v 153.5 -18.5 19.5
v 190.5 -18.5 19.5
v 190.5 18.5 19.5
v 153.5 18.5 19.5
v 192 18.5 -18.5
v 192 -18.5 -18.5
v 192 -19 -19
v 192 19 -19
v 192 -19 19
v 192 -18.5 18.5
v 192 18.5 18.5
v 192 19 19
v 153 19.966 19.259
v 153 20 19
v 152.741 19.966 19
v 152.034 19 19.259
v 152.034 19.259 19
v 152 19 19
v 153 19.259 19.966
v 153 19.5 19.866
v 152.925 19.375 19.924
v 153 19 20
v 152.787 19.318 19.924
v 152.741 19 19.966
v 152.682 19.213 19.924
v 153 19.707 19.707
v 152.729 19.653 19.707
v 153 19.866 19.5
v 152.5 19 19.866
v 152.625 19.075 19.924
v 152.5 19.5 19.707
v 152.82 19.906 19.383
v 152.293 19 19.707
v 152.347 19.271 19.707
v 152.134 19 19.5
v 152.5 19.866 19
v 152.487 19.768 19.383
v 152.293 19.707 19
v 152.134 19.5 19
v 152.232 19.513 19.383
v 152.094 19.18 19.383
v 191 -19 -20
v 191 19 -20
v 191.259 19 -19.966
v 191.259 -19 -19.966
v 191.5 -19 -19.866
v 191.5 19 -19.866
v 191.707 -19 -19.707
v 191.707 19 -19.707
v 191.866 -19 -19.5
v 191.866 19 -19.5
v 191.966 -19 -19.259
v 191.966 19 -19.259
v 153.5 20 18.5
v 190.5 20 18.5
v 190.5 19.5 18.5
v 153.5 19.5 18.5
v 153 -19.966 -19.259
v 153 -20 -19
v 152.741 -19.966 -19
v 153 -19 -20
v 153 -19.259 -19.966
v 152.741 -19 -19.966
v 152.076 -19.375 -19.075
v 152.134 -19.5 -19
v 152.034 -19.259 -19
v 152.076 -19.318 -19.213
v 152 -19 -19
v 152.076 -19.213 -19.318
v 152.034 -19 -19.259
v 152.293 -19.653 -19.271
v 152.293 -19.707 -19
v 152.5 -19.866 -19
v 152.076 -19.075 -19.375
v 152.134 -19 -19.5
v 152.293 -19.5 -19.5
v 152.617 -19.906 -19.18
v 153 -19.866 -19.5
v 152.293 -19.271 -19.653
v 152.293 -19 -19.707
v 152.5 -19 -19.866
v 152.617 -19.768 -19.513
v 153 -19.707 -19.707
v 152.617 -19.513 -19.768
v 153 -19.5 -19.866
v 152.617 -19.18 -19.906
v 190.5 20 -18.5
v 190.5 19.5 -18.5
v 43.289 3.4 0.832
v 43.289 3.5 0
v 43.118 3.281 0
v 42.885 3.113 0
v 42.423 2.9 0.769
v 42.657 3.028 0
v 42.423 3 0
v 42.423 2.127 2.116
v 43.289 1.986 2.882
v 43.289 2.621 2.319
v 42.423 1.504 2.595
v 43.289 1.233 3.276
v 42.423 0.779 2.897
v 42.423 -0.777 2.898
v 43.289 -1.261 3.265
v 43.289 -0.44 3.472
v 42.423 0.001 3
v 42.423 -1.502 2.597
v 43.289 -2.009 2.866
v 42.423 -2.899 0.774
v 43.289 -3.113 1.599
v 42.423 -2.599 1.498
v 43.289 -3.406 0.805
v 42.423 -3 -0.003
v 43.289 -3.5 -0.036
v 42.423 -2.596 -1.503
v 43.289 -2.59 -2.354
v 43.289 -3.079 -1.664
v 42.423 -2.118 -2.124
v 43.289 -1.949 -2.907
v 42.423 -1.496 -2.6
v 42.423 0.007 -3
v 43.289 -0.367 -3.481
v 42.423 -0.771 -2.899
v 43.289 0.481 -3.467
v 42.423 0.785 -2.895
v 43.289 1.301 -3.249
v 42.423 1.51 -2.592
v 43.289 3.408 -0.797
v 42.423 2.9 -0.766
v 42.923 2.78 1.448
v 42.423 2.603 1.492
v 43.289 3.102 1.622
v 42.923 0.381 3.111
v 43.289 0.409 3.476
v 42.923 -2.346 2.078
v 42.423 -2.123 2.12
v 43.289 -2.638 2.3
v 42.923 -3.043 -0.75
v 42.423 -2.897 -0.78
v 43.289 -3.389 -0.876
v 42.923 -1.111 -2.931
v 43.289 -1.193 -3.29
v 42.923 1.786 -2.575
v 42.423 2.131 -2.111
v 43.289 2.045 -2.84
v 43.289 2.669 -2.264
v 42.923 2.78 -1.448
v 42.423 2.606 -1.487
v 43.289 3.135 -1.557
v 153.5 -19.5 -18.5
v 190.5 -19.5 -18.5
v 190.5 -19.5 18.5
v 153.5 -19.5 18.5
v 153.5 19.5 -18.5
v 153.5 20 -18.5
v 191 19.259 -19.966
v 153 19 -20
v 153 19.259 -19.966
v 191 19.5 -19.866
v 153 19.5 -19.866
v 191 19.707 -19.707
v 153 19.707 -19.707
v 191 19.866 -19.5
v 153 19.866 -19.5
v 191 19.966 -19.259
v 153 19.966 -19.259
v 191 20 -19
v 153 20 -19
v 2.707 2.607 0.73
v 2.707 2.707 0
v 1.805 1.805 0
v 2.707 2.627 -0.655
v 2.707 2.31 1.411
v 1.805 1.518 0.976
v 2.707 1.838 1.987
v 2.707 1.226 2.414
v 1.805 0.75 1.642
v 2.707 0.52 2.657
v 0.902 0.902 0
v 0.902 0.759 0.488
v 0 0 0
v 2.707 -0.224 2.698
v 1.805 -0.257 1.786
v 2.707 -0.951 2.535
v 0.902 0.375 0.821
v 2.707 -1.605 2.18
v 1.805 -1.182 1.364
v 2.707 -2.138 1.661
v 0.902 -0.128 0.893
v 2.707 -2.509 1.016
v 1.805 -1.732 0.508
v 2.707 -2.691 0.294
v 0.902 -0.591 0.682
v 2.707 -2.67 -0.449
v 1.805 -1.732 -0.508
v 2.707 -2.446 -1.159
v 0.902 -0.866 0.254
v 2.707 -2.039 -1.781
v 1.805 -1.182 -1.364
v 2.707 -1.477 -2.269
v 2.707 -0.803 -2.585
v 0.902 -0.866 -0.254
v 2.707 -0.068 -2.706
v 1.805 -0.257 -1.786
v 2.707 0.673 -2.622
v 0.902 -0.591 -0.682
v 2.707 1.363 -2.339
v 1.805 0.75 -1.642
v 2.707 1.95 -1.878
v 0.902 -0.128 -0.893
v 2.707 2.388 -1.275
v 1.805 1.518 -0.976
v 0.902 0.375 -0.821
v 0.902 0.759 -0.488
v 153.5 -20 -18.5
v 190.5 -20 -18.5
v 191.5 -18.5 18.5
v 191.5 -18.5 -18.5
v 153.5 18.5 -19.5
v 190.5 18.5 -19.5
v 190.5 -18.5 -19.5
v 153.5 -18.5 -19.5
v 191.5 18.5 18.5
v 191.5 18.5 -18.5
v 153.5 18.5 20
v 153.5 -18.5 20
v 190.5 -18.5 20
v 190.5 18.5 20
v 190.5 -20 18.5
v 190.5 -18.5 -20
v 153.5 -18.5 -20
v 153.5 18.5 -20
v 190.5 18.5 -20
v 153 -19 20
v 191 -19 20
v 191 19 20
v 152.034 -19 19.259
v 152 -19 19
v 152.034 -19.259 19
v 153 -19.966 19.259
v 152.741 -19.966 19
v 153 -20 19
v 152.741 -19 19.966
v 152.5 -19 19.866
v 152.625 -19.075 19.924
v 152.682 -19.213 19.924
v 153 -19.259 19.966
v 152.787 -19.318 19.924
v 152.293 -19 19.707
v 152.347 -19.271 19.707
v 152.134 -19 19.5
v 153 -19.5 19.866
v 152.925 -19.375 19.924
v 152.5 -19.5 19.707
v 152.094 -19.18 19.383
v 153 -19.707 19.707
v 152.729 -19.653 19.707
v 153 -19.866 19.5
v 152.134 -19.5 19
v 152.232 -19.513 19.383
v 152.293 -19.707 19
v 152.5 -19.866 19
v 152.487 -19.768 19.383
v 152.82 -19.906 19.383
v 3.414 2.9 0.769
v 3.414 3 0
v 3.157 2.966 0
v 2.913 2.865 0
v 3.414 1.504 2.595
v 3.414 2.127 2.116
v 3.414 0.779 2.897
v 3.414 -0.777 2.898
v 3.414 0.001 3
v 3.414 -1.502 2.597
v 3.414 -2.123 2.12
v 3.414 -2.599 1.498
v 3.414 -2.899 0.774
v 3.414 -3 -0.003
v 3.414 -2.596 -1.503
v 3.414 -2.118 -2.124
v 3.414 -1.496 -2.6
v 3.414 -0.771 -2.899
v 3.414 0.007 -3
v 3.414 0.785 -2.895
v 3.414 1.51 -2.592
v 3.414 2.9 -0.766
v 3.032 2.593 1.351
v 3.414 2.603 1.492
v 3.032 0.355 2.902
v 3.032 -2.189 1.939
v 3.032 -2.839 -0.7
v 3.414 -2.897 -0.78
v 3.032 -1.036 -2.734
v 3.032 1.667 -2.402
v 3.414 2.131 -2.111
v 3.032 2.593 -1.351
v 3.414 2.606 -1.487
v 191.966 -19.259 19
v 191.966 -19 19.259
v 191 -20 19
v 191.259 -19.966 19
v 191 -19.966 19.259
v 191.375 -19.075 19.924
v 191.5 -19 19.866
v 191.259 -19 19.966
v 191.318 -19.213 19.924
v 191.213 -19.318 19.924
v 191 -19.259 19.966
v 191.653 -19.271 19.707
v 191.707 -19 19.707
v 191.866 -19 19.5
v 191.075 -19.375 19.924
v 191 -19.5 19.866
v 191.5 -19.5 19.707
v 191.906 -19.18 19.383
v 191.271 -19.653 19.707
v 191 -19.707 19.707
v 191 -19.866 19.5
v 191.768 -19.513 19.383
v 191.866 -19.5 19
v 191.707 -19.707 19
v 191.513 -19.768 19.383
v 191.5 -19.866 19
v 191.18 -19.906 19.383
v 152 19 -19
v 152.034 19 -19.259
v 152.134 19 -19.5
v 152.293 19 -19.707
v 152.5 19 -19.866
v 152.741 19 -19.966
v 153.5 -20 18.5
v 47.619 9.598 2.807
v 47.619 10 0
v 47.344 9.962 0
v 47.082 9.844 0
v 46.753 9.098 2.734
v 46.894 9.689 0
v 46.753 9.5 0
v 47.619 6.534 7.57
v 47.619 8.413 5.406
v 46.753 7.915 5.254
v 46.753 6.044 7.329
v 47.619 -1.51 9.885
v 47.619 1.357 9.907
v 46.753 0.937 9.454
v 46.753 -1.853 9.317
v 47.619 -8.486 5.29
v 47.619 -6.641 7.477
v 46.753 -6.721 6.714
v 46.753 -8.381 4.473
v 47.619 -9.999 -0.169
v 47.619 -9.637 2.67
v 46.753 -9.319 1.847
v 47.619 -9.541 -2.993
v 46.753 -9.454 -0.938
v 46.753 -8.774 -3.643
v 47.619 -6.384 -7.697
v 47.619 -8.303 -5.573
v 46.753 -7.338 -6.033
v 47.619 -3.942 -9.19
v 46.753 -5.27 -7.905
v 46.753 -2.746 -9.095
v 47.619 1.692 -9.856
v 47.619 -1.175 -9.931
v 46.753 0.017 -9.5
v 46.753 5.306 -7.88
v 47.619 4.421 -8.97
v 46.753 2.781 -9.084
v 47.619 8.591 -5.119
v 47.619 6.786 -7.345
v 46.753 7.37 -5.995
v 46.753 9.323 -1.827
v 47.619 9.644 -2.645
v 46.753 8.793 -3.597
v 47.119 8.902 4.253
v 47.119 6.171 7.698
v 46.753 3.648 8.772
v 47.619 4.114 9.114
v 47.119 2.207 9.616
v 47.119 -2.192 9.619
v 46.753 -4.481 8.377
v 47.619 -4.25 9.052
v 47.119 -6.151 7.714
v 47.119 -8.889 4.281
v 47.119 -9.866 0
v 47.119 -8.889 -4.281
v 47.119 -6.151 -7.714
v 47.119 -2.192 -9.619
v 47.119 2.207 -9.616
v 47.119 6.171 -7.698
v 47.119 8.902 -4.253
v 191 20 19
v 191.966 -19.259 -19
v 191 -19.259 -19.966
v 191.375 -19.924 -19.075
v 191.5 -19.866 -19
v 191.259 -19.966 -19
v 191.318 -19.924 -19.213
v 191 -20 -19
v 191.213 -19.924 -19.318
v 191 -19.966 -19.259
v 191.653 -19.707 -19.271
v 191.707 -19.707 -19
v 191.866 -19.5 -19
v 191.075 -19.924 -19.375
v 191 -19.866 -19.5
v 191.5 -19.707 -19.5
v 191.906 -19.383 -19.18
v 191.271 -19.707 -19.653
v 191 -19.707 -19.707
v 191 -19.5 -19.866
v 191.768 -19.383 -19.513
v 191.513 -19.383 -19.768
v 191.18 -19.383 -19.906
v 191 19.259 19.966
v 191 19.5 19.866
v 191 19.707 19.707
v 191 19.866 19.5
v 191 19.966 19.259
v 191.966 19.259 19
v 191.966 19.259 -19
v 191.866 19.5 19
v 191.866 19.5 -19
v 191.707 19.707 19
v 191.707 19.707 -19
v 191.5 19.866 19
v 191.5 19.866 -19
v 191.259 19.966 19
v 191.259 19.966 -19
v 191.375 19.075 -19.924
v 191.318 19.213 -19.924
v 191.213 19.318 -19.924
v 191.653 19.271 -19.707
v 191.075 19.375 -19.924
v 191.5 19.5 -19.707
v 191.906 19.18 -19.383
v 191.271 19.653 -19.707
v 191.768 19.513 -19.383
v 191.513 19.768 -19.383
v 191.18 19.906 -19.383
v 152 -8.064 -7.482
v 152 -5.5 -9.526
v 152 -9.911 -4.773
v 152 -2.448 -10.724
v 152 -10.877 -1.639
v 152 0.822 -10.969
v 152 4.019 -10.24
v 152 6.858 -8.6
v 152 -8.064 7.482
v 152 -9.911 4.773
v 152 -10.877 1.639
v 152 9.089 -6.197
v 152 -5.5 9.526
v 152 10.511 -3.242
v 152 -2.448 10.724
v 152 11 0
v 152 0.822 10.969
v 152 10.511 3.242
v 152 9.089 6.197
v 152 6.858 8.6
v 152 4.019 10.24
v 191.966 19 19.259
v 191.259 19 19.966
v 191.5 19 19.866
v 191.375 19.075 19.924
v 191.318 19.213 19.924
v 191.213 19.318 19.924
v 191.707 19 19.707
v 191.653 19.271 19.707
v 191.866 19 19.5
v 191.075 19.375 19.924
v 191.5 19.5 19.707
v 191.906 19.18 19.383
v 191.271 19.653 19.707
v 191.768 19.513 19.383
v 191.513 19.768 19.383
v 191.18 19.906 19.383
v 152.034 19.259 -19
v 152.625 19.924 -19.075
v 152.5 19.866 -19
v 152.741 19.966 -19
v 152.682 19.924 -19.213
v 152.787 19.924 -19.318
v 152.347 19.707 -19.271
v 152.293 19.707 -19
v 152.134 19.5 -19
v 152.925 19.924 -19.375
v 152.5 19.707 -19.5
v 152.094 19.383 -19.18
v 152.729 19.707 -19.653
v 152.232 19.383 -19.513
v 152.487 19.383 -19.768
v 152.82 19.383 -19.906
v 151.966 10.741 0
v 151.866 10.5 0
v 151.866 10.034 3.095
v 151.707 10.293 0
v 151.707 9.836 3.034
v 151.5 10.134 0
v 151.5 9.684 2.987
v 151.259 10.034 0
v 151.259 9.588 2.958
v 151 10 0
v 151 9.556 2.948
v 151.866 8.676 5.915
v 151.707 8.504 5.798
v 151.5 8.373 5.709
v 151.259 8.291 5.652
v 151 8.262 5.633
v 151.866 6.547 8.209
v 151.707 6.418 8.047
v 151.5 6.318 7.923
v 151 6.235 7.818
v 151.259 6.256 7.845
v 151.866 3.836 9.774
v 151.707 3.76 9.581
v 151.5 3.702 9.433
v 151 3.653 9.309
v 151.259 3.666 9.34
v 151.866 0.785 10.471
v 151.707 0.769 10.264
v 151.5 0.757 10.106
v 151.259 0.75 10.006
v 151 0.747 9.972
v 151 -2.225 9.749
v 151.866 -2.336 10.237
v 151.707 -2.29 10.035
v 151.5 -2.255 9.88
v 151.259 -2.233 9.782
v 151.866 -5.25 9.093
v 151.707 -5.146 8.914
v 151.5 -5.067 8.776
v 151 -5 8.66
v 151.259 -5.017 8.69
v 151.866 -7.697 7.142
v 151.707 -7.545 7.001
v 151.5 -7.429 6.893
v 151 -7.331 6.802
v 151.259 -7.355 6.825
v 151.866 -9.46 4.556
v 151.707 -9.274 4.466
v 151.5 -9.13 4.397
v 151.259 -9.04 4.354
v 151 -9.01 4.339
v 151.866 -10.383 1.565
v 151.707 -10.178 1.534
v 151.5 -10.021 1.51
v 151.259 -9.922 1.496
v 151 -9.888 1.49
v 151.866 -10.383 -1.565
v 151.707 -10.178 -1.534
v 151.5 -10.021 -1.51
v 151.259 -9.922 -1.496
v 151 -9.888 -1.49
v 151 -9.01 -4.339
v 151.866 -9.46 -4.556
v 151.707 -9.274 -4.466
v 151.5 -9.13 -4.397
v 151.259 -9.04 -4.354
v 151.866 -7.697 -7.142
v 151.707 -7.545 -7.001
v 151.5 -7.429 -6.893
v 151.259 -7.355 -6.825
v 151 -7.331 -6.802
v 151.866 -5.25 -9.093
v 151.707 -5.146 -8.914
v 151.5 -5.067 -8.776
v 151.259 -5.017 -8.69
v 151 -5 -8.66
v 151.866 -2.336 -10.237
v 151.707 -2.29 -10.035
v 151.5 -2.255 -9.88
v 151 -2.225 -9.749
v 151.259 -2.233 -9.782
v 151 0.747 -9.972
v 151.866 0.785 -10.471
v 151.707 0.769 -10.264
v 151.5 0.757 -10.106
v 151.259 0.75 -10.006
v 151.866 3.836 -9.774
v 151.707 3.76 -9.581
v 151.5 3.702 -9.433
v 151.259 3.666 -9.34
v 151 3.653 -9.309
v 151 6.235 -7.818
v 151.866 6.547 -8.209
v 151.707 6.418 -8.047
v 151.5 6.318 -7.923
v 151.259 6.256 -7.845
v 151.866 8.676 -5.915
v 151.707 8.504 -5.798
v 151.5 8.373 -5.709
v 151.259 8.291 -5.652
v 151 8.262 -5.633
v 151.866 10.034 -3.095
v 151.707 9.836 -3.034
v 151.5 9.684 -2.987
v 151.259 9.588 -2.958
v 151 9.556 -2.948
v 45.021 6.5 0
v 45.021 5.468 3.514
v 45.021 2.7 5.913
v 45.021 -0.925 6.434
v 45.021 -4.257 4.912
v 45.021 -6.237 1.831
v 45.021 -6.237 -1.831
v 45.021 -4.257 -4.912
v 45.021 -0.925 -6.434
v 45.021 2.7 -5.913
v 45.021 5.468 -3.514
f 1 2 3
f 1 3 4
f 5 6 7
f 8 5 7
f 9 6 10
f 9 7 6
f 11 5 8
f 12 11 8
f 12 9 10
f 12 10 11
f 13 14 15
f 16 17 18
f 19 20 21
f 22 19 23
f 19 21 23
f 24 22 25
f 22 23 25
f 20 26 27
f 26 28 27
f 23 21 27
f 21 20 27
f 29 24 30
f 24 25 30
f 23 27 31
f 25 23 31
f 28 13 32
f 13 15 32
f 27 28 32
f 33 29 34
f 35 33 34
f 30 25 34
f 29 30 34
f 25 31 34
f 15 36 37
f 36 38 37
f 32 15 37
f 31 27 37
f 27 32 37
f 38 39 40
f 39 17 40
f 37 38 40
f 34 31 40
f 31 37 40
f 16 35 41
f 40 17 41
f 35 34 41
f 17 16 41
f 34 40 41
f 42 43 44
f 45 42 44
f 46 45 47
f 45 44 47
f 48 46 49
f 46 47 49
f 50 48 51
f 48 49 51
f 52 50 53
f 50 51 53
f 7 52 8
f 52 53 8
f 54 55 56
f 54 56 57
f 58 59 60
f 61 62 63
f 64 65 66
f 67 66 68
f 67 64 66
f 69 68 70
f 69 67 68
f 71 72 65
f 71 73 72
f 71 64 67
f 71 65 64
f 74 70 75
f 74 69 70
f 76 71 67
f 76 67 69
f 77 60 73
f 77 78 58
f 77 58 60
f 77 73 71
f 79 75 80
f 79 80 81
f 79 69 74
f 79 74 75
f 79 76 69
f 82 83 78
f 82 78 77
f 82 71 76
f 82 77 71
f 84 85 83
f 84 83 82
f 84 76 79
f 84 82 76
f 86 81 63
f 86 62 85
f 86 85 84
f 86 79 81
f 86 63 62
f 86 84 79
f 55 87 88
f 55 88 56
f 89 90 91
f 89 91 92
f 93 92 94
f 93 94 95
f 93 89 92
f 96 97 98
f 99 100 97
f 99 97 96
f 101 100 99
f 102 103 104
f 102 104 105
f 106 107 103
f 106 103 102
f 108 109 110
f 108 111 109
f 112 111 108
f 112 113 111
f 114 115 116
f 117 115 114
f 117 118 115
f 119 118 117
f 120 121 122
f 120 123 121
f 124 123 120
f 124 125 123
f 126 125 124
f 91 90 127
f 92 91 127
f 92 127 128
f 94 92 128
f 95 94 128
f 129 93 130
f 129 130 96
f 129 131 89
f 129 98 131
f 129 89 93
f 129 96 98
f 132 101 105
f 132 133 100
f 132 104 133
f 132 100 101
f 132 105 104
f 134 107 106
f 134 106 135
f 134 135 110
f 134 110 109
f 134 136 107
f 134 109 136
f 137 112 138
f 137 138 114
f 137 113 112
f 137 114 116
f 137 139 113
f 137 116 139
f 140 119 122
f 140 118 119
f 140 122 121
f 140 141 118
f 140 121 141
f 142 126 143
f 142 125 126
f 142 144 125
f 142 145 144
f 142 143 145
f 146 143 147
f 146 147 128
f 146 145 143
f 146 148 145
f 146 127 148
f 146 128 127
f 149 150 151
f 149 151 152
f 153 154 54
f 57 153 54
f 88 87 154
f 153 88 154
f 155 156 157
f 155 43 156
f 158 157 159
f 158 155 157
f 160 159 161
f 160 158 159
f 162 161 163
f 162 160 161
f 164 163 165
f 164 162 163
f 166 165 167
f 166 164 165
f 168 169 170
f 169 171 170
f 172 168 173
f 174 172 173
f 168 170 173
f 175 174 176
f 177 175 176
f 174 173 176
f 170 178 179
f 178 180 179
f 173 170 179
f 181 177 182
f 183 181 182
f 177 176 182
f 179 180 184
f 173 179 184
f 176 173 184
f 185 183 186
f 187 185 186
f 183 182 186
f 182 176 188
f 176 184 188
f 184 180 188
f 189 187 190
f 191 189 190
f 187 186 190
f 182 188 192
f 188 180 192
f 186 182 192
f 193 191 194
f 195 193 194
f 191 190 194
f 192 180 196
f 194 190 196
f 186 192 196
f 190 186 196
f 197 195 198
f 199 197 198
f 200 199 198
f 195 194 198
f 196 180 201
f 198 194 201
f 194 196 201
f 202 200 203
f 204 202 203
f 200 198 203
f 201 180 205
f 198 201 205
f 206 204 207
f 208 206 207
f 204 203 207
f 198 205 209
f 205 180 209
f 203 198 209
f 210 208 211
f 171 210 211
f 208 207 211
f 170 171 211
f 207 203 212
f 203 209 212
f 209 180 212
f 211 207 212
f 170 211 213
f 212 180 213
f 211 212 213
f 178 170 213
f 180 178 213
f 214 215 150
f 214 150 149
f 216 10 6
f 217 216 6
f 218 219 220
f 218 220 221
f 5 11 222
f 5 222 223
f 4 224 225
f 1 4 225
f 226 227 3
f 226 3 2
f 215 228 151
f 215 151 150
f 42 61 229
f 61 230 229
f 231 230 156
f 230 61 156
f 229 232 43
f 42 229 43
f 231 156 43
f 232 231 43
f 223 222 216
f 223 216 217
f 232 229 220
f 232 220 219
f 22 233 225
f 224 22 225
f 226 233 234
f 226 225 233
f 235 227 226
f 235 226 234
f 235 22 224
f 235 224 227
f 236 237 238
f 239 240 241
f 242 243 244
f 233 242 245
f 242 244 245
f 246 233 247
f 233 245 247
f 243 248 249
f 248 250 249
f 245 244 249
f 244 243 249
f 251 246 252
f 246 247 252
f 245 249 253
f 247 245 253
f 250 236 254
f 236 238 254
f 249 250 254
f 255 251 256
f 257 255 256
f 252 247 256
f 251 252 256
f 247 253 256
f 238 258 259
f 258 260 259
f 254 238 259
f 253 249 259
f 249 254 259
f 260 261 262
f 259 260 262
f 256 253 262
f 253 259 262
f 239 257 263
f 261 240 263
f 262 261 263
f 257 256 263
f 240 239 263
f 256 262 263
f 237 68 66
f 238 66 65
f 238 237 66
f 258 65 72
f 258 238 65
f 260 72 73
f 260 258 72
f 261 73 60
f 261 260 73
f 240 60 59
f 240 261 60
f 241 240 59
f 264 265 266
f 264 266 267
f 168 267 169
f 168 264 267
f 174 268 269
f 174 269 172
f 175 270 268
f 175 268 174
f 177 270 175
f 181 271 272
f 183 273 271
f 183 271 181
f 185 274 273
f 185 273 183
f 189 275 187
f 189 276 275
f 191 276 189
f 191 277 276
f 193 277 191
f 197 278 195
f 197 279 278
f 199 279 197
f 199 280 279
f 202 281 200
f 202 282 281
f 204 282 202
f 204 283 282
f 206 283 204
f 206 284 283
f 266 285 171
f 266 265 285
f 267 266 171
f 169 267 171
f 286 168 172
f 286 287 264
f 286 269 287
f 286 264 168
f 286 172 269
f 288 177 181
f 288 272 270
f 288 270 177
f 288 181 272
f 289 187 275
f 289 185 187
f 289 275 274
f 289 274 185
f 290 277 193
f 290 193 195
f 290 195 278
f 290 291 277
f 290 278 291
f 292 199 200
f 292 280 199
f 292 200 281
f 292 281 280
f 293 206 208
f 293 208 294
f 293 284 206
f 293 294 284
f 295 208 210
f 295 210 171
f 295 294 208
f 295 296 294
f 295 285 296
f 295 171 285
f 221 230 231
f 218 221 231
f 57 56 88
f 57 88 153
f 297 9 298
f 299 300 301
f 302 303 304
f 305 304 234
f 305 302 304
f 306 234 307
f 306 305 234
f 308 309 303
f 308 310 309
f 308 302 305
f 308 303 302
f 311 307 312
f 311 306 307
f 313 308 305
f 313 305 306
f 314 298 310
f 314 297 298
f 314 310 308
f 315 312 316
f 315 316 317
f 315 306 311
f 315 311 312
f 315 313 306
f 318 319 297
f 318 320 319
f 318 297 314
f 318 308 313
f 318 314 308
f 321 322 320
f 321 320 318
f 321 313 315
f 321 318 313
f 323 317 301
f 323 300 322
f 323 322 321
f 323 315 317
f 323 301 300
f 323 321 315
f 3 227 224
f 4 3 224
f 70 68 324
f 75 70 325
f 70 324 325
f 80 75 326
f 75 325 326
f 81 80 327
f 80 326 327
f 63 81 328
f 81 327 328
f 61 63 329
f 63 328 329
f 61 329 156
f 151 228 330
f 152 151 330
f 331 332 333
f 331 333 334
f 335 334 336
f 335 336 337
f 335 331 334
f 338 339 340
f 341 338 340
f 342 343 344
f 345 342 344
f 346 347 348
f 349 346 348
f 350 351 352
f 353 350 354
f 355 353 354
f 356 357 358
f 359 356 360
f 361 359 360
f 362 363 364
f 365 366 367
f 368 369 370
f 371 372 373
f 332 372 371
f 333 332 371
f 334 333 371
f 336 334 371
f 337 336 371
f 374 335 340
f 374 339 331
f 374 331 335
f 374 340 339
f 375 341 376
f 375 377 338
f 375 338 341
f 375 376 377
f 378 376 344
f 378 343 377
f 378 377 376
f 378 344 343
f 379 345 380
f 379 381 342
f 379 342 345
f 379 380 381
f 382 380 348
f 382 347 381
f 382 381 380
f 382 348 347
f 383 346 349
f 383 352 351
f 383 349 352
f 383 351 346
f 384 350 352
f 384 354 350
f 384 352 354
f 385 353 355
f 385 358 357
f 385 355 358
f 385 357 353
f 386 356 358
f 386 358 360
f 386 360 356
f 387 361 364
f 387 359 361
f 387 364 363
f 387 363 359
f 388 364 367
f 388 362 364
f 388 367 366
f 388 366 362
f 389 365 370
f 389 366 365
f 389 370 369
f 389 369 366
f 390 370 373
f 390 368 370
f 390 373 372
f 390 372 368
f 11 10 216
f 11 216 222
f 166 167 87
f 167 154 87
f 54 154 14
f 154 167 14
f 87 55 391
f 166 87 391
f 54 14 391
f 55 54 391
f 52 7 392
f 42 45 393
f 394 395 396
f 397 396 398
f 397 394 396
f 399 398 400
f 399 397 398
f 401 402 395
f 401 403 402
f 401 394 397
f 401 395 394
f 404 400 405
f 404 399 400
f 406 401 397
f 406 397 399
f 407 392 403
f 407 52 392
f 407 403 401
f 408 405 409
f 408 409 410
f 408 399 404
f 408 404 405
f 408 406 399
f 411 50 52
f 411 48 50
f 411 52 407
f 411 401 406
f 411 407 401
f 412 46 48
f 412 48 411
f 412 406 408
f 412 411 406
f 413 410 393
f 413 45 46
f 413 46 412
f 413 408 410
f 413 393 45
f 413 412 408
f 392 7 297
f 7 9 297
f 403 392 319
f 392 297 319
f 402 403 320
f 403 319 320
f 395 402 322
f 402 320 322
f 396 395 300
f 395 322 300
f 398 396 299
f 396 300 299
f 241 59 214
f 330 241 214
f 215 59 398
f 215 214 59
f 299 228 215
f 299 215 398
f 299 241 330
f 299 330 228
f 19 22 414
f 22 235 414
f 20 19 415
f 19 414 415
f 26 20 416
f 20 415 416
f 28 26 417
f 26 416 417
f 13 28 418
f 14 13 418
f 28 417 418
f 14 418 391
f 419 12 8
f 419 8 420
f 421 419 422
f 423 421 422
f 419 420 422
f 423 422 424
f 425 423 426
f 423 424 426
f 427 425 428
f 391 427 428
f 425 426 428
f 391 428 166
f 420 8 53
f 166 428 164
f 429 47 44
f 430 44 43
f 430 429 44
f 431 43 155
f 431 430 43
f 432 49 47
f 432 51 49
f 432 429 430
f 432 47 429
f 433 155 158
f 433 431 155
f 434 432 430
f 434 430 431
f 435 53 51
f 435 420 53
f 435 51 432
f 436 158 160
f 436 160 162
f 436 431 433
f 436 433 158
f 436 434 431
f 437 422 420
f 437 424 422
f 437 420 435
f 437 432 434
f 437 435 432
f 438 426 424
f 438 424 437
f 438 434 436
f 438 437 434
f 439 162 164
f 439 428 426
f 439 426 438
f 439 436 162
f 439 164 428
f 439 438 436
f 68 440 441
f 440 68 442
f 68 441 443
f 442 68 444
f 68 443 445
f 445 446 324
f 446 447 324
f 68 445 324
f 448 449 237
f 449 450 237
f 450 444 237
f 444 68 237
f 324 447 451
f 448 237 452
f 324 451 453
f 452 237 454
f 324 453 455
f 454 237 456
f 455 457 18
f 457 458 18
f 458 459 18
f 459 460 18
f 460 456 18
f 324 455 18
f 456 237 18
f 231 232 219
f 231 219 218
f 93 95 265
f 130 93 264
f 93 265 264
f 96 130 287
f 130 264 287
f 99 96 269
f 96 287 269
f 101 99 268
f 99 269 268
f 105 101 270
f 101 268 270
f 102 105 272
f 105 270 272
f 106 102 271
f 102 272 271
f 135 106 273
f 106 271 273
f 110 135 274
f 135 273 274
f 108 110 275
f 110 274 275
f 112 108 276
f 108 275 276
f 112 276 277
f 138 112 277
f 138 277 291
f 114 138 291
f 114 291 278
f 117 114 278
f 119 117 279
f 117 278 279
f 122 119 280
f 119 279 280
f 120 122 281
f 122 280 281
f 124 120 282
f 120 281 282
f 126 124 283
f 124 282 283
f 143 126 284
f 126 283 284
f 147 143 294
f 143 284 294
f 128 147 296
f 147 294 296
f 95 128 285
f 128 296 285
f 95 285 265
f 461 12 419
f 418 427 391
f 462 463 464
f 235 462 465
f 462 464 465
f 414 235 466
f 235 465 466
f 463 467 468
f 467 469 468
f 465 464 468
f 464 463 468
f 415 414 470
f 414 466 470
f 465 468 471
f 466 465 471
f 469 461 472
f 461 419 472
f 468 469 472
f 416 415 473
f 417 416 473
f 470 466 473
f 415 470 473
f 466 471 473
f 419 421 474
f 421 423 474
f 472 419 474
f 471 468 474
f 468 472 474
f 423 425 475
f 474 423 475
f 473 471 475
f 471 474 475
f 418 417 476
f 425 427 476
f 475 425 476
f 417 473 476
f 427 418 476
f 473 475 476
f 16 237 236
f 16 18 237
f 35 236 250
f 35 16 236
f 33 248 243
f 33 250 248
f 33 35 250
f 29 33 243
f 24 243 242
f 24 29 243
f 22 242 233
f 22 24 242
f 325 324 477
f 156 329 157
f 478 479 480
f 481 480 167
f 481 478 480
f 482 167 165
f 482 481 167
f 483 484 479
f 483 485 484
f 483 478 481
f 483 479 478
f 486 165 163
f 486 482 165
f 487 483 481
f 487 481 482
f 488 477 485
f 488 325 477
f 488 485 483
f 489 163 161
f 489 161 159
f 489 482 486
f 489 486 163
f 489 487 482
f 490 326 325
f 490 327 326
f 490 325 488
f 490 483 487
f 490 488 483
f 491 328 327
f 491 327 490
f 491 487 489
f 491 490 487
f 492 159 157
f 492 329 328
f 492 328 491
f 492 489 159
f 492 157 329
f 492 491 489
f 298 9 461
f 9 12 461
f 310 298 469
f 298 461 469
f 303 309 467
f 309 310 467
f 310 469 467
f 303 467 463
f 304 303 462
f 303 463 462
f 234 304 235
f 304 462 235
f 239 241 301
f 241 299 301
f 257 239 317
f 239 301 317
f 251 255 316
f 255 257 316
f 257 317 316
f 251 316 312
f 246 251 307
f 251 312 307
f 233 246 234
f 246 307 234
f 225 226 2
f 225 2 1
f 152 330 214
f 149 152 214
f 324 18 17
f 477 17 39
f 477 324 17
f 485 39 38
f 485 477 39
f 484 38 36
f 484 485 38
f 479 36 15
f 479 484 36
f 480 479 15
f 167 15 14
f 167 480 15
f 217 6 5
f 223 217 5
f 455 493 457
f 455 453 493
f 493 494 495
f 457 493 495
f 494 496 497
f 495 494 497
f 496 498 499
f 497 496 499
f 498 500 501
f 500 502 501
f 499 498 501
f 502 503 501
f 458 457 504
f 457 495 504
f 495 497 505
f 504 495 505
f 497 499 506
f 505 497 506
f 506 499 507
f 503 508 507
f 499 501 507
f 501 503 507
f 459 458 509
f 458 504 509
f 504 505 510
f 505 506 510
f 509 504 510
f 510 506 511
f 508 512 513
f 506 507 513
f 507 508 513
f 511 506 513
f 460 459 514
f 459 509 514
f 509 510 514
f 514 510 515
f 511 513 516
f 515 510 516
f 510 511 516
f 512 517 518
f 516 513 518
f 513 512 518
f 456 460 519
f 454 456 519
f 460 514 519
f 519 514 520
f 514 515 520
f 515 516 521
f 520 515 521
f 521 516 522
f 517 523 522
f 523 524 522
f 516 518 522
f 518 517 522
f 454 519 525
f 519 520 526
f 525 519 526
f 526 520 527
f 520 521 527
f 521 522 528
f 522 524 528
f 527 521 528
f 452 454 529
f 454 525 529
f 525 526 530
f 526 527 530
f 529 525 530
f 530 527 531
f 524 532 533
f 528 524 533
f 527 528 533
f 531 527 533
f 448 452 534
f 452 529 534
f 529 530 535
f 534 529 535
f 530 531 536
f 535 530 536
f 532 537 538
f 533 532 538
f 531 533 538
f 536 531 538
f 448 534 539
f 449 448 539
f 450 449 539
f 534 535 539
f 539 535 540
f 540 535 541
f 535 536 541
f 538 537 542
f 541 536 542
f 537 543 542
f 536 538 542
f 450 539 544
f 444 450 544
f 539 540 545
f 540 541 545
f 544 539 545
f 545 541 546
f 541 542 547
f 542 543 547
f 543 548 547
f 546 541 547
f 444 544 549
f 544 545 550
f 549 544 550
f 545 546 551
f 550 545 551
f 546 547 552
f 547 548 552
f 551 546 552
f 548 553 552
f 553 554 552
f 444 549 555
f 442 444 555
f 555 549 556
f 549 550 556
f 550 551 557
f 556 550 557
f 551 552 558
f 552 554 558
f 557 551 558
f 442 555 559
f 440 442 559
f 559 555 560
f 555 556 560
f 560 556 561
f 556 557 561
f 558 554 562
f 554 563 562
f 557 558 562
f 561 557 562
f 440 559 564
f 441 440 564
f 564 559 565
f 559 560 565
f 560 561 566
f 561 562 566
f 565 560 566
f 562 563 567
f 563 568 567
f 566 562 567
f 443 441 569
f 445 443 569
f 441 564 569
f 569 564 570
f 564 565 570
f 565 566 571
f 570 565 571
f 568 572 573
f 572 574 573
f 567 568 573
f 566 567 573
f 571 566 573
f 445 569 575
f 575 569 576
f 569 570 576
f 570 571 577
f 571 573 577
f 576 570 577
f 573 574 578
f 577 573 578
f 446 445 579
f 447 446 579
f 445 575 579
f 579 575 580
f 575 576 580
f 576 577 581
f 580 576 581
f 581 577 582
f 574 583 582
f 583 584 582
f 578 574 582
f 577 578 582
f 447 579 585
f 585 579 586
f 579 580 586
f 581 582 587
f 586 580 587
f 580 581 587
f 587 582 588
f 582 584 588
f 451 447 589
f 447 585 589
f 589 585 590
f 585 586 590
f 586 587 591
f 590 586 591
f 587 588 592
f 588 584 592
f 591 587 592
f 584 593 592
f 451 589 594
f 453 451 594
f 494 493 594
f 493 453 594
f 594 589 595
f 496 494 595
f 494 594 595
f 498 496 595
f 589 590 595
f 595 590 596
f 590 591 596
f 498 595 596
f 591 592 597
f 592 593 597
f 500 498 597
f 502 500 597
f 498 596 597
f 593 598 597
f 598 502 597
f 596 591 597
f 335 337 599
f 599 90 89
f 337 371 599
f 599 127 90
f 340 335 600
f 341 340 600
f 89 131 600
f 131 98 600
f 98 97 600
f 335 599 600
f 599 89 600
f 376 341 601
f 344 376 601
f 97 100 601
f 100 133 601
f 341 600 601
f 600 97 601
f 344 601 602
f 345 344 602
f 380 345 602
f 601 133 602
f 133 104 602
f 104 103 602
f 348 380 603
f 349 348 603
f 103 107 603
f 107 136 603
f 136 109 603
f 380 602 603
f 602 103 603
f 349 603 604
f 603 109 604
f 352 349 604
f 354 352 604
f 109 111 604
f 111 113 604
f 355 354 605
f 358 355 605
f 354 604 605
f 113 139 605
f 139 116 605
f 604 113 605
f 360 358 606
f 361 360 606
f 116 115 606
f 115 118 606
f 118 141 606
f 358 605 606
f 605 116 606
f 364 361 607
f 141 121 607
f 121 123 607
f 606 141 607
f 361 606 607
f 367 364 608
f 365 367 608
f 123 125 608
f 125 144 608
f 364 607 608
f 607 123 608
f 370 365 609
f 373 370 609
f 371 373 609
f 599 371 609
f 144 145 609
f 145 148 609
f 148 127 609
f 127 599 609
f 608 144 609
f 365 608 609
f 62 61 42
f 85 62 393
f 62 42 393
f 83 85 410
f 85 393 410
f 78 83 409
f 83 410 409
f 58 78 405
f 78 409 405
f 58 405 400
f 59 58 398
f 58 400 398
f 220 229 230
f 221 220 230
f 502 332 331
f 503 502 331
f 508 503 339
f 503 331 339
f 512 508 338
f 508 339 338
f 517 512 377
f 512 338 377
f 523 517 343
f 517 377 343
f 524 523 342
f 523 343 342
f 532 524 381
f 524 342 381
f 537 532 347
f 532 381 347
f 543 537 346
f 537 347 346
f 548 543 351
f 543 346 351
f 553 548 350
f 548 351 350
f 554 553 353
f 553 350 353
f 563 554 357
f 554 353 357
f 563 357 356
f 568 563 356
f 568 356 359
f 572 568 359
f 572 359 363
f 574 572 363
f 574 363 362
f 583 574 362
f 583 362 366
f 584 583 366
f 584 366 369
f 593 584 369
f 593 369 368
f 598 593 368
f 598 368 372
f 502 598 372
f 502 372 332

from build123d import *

# Parameters (mm, degrees)
SKETCH2_W                = 40
SKETCH2_H                = 40
BOSS_EXTRUDE1_DEPTH      = 20
BOSS_EXTRUDE1_DEPTH_BACK = 20
FILLET2_R                = 1
FILLET3_R                = 1
SKETCH3_W                = 37
SKETCH3_H                = 37
CUT_EXTRUDE1_DEPTH       = 0.5
CIRPATTERN1_COUNT        = 4
CIRPATTERN3_COUNT        = 2
CIRPATTERN3_ANGLE        = 90


with BuildPart() as part:
    # Sketch1 → Revolve1 (revolve)
    with BuildSketch(Plane.XY):
        with BuildLine():
            Line((0, 0), (180, 0))
            Line((180, 0), (180, 2))
            ThreePointArc((180, 2), (177.656854249, 7.656854249), (172, 10))
            Line((172, 10), (61.659544264, 10))
            Line((61.659544264, 10), (47.041451884, 10))
            Line((47.041451884, 10), (43, 3))
            Line((43, 3), (3, 3))
            Line((3, 3), (0, 0))
        make_face()
    revolve(axis=Axis((0, 0, 0), (1, 0, 0)))

    # Sketch2 → Boss-Extrude1 (add, two sides)
    with BuildSketch(Plane.XY) as boss_extrude1_sk:
        with Locations((172, 0)):
            Rectangle(SKETCH2_W, SKETCH2_H)
    extrude(amount=BOSS_EXTRUDE1_DEPTH)
    extrude(boss_extrude1_sk.sketch, amount=-BOSS_EXTRUDE1_DEPTH_BACK)

    # Fillet2
    fillet2_edges = [part.edges().sort_by_distance(p)[0] for p in [
        (152, -10, 0),
        (192, 20, 0),
        (192, 0, -20),
        (192, -20, 0),
        (172, -20, -20),
        (152, -20, 0),
        (152, 0, -20),
        (152, 20, 0),
        (172, 20, -20),
        (192, 0, 20),
        (172, 20, 20),
        (152, 0, 20),
        (172, -20, 20),
    ]]
    fillet(fillet2_edges, radius=FILLET2_R)

    # Fillet3
    fillet3_edges = [part.edges().sort_by_distance(p)[0] for p in [
        (3, -3, 0),
        (43, -3, 0),
        (47.041451884, -10, 0),
    ]]
    fillet(fillet3_edges, radius=FILLET3_R)

    # Sketch3 → Cut-Extrude1 (cut)
    with BuildSketch(Plane(origin=(0, 0, -20), x_dir=(-1, 0, 0), z_dir=(0, 0, -1))):
        with Locations((-172, 0)):
            Rectangle(SKETCH3_W, SKETCH3_H)
    cut_extrude1 = extrude(amount=-CUT_EXTRUDE1_DEPTH, mode=Mode.SUBTRACT)

    # CirPattern1: Cut-Extrude1 ×4 about axis
    cirpattern1_axis = Axis((0, 0, 0), (1, 0, 0))
    for i in range(1, CIRPATTERN1_COUNT):
        add(cut_extrude1.rotate(cirpattern1_axis, i * 360 / CIRPATTERN1_COUNT), mode=Mode.SUBTRACT)

    # CirPattern3: Cut-Extrude1 ×2 about axis
    cirpattern3_axis = Axis((172, 0, 0), (0, -1, 0))
    for i in range(1, CIRPATTERN3_COUNT):
        add(cut_extrude1.rotate(cirpattern3_axis, i * CIRPATTERN3_ANGLE / (CIRPATTERN3_COUNT - 1)), mode=Mode.SUBTRACT)


solid = part.part
